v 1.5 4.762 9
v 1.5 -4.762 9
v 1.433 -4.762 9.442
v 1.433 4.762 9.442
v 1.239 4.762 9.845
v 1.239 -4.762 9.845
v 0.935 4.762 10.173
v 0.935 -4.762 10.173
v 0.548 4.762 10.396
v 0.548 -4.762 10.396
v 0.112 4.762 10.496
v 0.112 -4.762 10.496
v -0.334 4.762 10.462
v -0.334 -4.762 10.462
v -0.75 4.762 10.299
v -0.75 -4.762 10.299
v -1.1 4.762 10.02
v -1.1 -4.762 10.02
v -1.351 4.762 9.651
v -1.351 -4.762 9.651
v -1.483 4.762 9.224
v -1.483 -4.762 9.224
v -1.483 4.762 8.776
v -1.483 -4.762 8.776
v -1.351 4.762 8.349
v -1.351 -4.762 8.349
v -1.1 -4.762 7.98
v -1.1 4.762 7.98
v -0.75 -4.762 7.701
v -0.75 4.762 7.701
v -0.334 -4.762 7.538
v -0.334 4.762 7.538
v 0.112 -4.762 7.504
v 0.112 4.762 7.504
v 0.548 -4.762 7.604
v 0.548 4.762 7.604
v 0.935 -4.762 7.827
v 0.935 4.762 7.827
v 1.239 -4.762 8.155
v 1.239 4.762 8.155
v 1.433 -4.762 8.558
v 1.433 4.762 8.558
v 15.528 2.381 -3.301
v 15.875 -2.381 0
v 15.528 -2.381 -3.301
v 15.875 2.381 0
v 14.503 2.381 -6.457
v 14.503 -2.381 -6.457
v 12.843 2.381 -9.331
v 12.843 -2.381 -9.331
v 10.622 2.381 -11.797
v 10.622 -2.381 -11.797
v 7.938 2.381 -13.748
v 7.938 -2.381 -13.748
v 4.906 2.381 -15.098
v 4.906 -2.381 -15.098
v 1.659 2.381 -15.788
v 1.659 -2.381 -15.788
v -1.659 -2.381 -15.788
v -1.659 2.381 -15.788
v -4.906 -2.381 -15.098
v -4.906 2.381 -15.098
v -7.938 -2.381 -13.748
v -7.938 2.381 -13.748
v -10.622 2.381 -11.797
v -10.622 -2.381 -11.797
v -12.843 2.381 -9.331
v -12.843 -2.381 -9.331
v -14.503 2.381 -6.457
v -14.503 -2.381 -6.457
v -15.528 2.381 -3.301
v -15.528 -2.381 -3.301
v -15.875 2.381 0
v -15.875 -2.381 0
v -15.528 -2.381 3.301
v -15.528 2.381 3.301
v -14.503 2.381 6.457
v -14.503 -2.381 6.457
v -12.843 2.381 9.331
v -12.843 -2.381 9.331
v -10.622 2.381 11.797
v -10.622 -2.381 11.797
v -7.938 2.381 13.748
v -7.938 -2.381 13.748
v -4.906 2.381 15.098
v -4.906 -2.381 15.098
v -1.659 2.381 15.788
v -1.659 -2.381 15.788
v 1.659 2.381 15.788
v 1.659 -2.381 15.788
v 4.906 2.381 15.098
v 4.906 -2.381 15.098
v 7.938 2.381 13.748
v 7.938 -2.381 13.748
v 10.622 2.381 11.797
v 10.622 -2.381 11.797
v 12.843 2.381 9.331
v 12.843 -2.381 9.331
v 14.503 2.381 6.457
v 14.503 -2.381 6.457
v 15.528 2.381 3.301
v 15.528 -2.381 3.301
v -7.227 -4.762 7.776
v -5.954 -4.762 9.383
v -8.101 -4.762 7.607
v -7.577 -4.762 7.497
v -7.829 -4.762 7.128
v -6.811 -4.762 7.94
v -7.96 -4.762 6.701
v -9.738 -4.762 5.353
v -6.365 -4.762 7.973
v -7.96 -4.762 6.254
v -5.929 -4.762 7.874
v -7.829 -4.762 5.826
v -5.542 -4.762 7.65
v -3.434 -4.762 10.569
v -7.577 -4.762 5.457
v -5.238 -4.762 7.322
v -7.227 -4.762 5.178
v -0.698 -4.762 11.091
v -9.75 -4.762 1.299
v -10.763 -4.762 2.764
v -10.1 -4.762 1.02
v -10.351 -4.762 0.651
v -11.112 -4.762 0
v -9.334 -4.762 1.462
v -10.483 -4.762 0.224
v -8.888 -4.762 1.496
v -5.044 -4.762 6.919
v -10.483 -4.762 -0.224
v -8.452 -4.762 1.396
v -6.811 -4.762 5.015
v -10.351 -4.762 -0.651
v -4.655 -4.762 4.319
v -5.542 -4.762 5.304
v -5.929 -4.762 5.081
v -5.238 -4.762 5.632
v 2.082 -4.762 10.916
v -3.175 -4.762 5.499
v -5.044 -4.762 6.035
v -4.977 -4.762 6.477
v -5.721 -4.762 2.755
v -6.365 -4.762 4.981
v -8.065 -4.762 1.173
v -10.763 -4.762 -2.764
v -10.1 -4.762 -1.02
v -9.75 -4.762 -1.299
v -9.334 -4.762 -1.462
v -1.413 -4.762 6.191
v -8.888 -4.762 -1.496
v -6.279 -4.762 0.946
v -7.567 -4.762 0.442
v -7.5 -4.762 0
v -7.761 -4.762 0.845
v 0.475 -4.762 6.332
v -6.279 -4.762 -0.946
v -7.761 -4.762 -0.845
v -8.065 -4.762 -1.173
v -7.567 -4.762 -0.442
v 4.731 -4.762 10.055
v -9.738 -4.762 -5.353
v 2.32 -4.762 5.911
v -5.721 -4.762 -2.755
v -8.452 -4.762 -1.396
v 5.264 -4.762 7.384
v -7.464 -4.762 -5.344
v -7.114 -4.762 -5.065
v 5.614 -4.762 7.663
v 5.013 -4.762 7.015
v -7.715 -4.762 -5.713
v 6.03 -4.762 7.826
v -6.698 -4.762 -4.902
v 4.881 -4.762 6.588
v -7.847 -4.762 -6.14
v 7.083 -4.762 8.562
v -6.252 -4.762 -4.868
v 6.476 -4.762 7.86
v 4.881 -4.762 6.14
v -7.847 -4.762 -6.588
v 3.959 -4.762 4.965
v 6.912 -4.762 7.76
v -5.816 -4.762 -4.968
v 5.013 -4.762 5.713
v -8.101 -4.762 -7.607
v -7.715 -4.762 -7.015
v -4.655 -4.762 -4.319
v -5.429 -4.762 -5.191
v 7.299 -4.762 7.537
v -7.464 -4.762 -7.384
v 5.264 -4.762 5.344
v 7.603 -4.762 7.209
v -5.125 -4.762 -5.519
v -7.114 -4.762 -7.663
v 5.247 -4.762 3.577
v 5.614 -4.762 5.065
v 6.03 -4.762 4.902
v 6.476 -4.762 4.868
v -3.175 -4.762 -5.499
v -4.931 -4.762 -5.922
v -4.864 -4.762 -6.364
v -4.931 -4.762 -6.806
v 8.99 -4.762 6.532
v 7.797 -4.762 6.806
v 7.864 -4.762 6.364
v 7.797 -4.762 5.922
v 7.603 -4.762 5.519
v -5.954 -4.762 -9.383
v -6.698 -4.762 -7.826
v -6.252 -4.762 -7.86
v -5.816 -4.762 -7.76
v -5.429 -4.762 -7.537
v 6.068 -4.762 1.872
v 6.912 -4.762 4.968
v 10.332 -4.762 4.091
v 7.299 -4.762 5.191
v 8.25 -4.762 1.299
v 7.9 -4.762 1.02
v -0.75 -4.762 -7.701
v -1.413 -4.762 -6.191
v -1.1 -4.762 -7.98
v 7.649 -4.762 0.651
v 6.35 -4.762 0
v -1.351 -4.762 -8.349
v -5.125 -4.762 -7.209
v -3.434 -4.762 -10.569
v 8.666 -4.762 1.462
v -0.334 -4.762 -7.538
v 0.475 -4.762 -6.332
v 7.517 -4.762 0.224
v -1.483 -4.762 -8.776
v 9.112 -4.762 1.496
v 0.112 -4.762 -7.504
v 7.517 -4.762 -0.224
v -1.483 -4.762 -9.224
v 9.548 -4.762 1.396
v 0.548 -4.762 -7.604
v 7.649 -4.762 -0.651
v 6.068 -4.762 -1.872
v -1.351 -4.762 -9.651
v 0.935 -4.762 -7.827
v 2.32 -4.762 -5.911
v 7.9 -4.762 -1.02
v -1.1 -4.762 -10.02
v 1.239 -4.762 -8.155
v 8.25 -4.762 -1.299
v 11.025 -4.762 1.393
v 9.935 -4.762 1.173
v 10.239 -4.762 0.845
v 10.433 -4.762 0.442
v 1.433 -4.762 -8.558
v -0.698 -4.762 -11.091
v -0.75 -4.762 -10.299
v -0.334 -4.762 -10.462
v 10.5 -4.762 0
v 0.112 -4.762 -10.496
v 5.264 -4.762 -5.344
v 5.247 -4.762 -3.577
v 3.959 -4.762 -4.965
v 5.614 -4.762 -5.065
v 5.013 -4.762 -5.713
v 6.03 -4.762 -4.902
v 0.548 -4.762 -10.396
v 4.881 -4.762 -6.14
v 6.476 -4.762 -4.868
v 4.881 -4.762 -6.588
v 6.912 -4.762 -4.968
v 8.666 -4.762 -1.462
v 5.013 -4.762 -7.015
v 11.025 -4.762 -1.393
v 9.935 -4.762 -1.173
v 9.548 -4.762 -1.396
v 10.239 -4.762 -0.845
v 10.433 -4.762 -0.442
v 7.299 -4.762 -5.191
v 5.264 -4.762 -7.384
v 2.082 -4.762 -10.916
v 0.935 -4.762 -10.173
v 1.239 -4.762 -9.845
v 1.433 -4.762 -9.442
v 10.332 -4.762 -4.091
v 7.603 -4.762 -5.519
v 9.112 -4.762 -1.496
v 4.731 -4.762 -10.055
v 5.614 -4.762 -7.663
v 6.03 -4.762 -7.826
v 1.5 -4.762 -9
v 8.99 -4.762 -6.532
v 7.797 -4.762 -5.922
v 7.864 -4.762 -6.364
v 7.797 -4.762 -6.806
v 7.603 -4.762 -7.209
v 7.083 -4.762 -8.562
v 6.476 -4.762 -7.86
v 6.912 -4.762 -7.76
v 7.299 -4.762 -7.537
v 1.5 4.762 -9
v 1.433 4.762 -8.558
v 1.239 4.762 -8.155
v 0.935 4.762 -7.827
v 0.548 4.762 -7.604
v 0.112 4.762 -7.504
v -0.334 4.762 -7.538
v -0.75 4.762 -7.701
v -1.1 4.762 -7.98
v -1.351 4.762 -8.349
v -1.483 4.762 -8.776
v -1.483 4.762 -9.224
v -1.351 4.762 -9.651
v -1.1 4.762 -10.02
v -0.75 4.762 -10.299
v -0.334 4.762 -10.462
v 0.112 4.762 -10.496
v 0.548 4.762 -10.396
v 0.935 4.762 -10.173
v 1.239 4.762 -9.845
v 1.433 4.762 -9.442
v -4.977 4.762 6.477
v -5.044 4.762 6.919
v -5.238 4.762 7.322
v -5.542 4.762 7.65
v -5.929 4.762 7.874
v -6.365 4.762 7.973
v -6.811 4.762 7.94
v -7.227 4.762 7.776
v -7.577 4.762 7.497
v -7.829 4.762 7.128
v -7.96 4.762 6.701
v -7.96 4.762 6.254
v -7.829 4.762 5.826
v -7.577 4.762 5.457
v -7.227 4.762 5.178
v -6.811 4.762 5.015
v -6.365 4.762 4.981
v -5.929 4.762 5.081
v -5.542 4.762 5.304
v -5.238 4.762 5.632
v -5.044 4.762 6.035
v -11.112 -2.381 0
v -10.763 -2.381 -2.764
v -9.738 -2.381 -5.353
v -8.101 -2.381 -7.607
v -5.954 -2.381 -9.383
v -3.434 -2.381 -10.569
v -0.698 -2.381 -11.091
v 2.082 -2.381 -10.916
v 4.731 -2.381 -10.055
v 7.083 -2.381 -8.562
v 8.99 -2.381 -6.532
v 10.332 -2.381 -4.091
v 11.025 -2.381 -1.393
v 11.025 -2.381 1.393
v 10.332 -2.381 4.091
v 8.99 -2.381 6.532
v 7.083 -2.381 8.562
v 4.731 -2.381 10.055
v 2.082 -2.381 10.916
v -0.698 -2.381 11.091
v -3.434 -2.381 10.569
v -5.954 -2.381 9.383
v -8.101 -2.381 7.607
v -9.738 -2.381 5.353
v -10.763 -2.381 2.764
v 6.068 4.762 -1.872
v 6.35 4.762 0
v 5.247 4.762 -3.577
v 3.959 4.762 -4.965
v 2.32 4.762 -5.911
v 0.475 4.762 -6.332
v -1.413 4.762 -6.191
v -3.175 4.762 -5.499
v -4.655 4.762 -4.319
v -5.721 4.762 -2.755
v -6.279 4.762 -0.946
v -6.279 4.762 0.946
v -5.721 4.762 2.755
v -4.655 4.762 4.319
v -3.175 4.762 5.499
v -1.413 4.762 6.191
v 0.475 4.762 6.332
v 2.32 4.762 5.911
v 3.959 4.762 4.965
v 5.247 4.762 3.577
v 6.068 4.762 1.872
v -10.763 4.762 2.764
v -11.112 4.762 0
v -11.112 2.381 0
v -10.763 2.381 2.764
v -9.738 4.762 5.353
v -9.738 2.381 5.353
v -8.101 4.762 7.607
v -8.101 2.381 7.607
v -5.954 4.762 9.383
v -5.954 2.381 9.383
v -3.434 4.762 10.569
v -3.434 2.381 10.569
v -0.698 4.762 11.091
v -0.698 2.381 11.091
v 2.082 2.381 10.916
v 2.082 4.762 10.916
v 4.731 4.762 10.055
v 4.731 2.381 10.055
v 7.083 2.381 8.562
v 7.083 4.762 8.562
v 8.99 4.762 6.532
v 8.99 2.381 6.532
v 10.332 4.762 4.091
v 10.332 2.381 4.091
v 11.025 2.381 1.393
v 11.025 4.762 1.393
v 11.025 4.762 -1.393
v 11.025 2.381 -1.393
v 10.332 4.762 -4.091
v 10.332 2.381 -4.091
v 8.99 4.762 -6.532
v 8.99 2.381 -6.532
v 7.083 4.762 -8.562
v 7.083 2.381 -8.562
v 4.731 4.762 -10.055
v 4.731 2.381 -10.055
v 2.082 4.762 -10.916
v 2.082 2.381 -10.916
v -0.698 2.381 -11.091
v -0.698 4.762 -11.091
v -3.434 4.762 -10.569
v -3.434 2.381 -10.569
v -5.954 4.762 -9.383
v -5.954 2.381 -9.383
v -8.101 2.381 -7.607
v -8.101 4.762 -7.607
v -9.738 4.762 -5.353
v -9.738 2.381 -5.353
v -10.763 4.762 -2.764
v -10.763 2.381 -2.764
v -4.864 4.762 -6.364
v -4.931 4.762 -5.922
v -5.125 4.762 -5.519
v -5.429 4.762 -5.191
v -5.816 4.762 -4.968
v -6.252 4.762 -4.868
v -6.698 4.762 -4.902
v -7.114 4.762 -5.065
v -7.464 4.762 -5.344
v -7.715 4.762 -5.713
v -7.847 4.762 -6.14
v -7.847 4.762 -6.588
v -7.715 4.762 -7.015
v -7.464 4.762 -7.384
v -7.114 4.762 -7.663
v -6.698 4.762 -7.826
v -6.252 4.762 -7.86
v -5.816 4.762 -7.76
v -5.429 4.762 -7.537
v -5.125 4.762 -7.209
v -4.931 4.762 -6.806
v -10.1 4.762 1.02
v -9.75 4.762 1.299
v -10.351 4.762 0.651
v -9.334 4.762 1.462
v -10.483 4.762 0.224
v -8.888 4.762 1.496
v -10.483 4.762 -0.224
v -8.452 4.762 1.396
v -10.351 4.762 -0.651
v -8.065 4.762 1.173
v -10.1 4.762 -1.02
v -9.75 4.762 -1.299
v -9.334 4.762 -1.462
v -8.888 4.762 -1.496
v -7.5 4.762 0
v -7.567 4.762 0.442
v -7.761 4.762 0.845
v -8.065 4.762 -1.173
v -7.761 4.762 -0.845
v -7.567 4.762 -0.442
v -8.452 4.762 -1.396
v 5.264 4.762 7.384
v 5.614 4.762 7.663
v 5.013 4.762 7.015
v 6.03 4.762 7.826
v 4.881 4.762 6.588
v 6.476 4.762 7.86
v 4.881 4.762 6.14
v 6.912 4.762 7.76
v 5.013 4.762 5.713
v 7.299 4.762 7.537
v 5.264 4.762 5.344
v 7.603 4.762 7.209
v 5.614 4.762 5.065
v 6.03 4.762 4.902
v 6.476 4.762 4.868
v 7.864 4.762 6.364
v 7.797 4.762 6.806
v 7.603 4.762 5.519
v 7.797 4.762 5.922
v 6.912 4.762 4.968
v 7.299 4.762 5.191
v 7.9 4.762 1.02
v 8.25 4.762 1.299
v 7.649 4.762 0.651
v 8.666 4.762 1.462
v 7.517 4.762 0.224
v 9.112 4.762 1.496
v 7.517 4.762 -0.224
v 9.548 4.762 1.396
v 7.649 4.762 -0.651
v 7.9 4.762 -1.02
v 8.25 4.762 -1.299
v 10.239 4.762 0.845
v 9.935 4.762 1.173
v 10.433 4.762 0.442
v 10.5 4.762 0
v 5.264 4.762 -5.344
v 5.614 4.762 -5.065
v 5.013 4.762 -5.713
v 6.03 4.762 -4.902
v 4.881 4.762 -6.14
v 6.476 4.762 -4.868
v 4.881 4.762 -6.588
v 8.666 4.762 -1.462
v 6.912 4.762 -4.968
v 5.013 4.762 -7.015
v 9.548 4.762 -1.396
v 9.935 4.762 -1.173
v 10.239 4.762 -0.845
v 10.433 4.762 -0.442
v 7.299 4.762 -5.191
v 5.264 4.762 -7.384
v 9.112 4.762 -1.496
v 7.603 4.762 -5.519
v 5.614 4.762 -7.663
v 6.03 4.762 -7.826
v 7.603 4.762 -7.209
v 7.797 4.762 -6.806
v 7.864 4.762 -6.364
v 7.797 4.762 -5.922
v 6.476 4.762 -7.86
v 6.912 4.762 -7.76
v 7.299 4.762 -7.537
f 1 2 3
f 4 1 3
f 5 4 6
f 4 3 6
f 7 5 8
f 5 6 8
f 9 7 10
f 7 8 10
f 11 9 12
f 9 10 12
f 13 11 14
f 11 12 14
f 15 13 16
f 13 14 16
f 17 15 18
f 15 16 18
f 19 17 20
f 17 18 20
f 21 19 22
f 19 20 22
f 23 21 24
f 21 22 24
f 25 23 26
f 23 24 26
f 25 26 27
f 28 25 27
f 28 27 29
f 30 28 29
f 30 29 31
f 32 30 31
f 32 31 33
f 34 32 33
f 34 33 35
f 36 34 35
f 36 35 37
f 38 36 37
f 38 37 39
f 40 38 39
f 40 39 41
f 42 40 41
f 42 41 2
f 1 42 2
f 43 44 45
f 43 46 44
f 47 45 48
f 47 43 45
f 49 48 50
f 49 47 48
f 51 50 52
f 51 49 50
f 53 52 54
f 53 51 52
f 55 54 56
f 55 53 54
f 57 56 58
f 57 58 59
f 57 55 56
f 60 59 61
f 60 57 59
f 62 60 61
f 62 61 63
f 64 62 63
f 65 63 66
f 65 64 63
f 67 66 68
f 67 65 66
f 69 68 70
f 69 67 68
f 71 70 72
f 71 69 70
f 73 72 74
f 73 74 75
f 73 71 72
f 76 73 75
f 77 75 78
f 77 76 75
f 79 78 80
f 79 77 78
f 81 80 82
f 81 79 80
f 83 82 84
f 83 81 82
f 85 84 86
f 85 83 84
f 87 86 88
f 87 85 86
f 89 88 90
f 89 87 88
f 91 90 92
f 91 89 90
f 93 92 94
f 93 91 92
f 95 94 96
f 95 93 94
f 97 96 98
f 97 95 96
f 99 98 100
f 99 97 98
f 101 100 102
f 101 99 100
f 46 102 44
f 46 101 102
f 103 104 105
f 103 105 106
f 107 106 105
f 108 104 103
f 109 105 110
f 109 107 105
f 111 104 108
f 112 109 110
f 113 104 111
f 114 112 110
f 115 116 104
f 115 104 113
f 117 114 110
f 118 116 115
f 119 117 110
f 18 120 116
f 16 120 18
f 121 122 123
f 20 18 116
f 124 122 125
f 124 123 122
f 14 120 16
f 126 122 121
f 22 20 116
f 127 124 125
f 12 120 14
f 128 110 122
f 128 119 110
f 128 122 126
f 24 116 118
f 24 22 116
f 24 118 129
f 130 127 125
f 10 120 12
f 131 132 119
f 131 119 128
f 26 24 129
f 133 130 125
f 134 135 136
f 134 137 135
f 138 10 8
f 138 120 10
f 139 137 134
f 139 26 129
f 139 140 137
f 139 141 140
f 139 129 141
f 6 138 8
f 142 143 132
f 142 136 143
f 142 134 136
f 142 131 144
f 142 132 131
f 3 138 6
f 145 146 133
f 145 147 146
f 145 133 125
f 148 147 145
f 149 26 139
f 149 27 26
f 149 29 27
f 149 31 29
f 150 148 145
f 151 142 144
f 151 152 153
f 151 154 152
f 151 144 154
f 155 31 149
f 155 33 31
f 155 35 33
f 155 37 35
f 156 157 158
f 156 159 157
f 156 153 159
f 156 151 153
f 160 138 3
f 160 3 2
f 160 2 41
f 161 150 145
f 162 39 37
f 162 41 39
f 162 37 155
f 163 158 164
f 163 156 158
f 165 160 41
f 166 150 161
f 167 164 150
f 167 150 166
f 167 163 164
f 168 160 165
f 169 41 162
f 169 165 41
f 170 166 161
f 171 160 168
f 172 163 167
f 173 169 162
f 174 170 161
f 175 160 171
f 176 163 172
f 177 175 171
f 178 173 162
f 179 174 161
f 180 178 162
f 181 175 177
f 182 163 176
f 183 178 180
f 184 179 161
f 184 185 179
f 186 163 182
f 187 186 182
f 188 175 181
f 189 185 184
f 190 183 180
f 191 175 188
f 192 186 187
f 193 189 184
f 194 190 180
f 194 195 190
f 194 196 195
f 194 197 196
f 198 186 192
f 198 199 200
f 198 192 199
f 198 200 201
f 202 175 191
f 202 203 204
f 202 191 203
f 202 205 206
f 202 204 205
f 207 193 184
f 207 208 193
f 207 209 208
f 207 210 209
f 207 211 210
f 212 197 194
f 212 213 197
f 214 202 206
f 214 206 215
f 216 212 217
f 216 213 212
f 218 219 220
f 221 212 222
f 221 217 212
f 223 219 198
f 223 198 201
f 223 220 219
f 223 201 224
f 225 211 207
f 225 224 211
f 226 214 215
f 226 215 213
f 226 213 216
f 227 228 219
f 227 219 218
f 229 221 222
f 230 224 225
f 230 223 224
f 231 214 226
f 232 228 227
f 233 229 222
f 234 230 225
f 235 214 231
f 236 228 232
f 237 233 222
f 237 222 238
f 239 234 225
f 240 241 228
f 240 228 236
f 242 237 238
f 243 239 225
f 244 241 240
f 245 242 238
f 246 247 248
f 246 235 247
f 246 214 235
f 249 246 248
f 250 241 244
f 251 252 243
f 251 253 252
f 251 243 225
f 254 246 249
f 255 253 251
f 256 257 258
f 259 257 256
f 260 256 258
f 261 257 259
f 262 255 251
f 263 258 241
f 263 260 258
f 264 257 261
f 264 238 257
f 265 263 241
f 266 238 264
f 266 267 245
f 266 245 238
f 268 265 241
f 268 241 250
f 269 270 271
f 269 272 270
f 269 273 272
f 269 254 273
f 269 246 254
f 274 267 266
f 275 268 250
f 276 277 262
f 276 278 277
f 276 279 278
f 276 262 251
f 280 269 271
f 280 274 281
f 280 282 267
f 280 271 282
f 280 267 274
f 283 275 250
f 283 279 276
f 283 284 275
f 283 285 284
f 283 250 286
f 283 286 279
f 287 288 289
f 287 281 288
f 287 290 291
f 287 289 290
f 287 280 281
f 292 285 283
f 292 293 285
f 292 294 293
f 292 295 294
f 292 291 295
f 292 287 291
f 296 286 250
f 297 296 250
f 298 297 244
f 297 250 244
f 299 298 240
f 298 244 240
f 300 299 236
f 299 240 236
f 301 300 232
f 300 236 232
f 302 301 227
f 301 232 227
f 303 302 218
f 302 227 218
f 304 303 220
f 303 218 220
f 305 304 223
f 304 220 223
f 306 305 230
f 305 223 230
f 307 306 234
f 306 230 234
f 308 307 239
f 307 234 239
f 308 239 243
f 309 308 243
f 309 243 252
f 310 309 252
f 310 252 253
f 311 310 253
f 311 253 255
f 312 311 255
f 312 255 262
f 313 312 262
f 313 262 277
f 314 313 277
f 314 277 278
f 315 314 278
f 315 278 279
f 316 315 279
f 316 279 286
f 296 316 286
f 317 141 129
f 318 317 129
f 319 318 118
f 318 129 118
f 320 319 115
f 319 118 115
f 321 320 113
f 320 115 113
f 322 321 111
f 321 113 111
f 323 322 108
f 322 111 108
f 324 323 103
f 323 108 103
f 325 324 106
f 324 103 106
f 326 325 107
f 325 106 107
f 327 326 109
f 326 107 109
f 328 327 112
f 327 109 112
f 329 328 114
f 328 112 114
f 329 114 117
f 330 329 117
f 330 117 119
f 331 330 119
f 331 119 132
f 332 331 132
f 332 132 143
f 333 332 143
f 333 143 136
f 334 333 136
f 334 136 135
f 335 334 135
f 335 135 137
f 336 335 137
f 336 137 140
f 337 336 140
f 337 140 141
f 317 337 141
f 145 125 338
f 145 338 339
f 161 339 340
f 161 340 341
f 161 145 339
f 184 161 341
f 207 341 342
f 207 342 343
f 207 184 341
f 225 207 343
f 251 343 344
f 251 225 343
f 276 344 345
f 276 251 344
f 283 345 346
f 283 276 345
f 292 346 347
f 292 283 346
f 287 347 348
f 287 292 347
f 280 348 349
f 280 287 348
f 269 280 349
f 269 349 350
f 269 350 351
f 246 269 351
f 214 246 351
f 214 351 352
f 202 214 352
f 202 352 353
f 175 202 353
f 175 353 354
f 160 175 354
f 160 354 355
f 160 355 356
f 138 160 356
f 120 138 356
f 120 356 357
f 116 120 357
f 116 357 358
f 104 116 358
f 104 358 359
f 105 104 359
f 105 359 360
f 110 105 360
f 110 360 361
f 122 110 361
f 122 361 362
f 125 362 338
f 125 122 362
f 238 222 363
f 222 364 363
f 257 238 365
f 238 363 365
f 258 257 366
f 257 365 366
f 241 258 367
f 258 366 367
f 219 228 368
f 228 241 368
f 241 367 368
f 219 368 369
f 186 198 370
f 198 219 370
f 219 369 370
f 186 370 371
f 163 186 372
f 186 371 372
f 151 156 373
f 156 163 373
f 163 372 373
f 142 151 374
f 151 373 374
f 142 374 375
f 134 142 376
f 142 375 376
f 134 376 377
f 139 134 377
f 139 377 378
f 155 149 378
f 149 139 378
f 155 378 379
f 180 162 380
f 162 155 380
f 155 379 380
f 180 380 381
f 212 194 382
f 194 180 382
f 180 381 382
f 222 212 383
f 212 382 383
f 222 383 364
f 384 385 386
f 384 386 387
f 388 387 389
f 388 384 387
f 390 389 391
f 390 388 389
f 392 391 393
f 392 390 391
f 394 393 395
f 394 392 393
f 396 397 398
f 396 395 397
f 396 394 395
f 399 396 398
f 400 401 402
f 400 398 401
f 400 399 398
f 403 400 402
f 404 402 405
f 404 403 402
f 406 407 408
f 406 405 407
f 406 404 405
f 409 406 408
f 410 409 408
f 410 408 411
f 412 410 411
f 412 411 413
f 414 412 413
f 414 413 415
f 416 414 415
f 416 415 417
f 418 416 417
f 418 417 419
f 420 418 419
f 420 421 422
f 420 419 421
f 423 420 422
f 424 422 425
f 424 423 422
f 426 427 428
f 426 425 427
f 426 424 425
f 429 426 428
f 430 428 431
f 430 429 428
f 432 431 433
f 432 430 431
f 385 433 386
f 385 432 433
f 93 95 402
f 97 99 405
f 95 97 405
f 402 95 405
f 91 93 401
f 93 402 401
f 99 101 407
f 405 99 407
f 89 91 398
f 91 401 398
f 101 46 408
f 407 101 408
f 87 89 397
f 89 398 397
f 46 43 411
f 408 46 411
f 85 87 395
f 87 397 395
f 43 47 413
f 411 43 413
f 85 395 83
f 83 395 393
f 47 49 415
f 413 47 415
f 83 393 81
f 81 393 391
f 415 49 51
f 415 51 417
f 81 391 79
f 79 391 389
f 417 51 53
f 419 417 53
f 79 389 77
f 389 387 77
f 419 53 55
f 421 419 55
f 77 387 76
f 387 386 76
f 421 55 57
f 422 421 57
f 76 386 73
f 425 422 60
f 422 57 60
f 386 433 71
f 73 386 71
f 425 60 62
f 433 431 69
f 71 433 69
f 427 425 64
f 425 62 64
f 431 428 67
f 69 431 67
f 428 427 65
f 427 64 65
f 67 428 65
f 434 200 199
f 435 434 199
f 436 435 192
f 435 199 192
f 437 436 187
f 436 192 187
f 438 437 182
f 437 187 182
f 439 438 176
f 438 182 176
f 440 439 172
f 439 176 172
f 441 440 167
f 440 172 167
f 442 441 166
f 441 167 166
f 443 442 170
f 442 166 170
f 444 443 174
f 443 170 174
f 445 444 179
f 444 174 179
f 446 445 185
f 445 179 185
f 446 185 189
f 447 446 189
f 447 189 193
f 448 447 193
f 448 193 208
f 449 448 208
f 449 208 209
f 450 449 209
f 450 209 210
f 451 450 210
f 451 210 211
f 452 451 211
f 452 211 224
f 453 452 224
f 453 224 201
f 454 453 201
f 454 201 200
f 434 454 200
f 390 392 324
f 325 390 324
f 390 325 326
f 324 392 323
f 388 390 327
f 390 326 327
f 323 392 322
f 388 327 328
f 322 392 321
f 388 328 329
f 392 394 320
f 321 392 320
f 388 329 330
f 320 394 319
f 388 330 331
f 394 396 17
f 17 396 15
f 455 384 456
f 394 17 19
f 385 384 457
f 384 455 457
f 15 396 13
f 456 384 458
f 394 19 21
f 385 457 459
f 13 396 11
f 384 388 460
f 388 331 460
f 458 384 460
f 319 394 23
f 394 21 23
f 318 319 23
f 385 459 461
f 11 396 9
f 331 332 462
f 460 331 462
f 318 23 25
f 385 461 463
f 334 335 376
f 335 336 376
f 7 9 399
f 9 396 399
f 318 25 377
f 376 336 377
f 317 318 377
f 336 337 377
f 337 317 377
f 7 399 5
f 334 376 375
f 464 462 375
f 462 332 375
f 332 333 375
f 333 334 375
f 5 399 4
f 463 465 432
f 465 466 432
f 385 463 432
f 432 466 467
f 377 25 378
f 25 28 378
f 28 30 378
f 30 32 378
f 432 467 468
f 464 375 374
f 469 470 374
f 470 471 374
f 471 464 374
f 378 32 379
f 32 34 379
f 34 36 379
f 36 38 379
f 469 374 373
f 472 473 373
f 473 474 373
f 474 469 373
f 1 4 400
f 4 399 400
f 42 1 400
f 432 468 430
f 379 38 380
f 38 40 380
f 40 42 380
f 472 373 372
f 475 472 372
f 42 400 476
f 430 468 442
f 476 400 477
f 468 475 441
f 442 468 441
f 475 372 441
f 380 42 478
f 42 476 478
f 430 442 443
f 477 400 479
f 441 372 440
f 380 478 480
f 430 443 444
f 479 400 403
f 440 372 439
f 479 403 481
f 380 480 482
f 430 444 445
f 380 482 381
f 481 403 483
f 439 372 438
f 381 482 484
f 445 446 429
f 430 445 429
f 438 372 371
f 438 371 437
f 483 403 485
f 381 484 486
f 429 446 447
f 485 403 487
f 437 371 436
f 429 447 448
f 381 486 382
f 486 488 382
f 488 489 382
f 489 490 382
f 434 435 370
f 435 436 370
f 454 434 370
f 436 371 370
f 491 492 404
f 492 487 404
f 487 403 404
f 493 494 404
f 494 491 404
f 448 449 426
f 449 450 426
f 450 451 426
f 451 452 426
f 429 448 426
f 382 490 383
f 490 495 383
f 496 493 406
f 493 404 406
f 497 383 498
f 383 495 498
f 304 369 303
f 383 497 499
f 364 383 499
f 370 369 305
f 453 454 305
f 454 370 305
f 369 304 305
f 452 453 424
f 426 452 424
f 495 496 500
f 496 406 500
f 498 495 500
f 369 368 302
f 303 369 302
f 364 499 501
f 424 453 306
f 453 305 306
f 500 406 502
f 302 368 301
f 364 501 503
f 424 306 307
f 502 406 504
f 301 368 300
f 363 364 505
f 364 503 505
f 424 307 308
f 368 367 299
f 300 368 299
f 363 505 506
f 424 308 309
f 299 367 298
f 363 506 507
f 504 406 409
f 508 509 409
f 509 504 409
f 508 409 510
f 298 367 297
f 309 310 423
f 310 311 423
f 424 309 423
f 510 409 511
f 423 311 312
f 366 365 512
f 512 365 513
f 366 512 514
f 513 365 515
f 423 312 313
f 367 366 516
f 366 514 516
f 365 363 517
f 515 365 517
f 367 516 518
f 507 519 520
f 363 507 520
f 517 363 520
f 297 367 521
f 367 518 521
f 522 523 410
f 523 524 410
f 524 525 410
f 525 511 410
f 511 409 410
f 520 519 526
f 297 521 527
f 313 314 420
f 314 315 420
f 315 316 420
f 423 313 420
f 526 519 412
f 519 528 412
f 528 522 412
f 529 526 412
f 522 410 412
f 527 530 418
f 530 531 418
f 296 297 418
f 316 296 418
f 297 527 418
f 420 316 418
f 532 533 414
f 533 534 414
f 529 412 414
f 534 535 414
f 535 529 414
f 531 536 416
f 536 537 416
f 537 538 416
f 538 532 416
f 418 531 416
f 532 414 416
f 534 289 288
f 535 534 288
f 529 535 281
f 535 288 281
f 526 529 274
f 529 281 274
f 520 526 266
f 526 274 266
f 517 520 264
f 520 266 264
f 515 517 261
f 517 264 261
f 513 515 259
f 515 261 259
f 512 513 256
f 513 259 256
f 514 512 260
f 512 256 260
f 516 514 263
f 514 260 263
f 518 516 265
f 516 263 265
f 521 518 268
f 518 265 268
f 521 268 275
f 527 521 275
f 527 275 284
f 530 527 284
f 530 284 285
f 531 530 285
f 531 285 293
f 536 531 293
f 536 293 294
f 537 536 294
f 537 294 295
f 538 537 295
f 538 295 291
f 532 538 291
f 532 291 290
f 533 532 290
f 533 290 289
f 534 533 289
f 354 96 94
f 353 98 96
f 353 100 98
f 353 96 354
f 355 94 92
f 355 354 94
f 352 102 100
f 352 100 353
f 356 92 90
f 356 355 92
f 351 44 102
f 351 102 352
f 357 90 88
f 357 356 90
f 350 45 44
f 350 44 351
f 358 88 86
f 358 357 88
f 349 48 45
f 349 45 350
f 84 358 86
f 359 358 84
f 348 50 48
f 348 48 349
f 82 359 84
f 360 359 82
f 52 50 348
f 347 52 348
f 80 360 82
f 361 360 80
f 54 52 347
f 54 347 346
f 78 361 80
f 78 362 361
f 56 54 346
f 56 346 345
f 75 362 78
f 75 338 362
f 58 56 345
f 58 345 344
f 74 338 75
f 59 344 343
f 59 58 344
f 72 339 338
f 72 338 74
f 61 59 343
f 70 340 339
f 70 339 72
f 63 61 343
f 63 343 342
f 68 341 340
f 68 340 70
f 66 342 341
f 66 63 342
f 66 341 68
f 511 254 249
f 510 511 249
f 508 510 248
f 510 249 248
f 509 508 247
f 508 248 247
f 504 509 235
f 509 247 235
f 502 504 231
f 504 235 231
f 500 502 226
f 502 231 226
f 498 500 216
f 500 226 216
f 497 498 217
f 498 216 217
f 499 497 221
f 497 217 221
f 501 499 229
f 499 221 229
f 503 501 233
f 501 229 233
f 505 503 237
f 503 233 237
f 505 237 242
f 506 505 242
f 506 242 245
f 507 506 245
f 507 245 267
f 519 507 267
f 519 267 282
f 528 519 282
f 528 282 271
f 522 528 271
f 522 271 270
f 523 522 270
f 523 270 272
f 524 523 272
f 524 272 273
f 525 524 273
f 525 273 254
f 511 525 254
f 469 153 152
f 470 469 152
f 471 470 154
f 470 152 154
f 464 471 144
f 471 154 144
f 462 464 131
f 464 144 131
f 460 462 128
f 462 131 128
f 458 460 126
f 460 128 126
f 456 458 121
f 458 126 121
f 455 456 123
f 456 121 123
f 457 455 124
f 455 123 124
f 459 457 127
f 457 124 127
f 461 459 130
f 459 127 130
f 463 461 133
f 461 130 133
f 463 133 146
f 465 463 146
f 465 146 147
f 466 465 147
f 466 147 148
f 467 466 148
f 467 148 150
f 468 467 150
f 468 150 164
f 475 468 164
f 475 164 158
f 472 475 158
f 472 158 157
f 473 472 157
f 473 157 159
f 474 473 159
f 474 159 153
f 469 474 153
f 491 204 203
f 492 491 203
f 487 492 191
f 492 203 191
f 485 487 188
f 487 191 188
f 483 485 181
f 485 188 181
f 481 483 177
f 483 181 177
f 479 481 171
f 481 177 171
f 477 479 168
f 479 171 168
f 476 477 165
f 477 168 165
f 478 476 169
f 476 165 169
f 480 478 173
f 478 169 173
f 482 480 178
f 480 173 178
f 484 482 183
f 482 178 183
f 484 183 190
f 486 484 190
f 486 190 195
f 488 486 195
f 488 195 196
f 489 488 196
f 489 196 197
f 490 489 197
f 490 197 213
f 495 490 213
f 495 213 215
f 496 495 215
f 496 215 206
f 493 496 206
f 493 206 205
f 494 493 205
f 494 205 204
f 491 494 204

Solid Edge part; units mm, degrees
sketch "Sketch1" plane through (0, 0, 0) normal (0, -1, 0) x (1, 0, 0)
  circle A0 centre (0, 0) radius 6.35
  circle A1 centre (0, 0) radius 15.875
extrude "Protrusion1" add sketch "Sketch1" along normal mid plane 9.525
sketch "Sketch2" plane through (0, -4.7625, 0) normal (0, -1, 0) x (1, 0, 0)
  circle A0 centre (0, 9) radius 1.5
  circle A1 centre (9, 0) radius 1.5
  circle A2 centre (0, -9) radius 1.5
  circle A3 centre (-9, 0) radius 1.5
  circle A4 centre (-6.4772, 6.4772) radius 1.5
  circle A5 centre (6.364, 6.364) radius 1.5
  circle A6 centre (6.364, -6.364) radius 1.5
  circle A7 centre (-6.364, -6.364) radius 1.5
extrude "Cutout1" cut sketch "Sketch2" against normal up to surface (9.525 mm away)
sketch "Sketch3" plane through (0, 0, 0) normal (0, 0, 1) x (1, 0, 0)
  line L0 (-15.875, -2.3812) -> (-11.1125, -2.3812)
  line L1 (-11.1125, -2.3812) -> (-11.1125, -4.7625)
  line L2 (-11.1125, -4.7625) -> (-15.875, -4.7625)
  line L3 (-15.875, -4.7625) -> (-15.875, -2.3812)
  line L4 (-15.875, 2.3812) -> (-11.1125, 2.3812)
  line L5 (-11.1125, 2.3812) -> (-11.1125, 4.7625)
  line L6 (-11.1125, 4.7625) -> (-15.875, 4.7625)
  line L7 (-15.875, 4.7625) -> (-15.875, 2.3812)
  dimension "D1" = 4.7625
  dimension "D2" = 2.3812
revolve "RevolvedCutout1" cut sketch "Sketch3" angle 360 about axis through (0, 54.0067, 0) along (0, -1, 0)
